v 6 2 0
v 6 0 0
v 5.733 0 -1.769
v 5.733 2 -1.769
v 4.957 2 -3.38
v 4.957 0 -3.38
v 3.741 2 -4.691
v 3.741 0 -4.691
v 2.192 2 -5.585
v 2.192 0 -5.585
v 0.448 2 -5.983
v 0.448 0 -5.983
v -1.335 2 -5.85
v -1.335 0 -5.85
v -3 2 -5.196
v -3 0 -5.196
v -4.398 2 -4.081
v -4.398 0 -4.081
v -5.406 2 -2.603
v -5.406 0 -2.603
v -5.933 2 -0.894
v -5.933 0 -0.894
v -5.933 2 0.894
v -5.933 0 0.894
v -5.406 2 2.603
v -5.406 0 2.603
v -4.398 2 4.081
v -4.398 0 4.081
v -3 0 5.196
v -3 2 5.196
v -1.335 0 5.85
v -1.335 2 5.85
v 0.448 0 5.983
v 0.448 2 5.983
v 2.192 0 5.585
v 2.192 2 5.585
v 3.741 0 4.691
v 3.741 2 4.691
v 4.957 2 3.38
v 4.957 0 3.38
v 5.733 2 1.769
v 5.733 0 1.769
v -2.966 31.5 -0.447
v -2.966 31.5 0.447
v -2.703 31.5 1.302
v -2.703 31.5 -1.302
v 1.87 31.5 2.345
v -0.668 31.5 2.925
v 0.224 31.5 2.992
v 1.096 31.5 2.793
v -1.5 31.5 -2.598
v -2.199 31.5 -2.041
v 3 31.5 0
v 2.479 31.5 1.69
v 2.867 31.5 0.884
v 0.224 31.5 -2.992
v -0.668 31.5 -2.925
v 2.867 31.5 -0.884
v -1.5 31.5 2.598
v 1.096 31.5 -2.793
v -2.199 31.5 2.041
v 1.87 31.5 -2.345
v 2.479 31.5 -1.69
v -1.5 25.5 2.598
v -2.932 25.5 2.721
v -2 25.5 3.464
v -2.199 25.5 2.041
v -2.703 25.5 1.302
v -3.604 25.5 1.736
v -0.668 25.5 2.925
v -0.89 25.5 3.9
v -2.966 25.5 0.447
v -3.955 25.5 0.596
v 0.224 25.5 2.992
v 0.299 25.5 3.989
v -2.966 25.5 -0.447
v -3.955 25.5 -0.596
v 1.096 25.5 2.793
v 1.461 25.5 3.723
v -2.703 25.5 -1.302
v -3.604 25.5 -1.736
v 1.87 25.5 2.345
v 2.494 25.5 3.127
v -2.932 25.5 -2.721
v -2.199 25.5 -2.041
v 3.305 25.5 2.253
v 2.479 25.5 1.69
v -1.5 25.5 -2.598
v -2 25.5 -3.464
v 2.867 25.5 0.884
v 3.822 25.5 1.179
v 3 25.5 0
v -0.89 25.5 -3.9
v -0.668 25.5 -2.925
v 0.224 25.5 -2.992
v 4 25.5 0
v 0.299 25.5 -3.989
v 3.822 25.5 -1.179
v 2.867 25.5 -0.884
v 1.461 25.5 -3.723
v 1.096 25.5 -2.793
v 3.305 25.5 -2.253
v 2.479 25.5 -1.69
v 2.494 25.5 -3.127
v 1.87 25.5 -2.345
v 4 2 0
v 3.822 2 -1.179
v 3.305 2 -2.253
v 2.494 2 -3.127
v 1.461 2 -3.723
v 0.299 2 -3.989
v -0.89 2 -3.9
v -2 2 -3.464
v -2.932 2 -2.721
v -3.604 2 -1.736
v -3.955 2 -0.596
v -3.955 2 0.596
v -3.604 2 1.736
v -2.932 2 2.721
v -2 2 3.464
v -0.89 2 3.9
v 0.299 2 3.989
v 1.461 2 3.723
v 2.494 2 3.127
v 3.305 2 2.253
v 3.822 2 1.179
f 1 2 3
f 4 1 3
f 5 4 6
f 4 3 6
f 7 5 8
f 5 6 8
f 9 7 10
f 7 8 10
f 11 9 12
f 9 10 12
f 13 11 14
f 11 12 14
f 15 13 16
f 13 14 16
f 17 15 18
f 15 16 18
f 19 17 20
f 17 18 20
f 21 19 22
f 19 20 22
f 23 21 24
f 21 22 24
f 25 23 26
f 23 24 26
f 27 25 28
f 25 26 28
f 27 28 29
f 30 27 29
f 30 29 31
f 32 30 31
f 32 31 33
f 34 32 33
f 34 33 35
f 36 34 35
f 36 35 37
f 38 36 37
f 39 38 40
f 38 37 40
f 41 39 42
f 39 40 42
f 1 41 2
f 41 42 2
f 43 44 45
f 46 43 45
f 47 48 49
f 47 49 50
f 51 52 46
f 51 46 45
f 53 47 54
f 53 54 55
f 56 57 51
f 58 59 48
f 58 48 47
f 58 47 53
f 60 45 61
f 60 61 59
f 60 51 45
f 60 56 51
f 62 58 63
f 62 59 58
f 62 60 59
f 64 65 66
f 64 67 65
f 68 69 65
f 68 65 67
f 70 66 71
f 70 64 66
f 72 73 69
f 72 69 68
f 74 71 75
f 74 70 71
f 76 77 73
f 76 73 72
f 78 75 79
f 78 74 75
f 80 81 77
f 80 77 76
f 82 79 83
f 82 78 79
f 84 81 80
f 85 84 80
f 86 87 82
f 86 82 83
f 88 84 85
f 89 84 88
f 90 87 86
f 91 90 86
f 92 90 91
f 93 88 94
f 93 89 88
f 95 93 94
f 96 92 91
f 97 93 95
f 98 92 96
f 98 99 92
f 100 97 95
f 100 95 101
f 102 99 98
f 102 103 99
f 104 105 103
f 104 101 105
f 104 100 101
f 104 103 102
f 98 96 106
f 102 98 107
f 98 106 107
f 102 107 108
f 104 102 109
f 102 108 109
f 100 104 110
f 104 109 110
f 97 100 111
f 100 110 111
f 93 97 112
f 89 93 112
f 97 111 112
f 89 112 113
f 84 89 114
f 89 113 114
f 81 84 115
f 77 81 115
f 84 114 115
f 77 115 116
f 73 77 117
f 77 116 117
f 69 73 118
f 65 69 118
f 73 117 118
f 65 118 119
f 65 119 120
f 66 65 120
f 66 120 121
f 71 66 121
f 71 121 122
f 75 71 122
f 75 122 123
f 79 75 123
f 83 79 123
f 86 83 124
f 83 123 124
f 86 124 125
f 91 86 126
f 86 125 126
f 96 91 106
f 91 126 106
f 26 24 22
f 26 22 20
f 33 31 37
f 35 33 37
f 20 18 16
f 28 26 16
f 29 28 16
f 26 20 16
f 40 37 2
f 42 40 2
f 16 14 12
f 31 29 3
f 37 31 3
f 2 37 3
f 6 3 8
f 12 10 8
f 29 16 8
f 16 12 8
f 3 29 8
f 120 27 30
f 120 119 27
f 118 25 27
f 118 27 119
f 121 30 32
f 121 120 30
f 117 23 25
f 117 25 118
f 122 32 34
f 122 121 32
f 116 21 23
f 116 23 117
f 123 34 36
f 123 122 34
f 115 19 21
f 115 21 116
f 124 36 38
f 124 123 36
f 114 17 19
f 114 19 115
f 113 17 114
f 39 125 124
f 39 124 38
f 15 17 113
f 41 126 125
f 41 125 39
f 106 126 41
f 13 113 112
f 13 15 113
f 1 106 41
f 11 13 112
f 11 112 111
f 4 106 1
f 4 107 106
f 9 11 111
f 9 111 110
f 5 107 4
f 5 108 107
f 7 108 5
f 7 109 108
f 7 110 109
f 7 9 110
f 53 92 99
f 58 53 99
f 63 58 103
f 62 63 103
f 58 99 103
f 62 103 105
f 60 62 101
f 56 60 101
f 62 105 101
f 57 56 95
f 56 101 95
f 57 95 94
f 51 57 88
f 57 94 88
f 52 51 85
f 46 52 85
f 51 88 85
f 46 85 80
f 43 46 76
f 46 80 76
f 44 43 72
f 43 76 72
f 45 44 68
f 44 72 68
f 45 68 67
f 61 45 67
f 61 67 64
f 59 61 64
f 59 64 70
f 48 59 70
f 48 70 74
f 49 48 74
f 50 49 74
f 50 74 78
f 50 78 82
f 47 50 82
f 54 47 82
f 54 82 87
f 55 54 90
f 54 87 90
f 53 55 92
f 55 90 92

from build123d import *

# Parameters (mm, degrees)
SKETCH_1_R      = 6
EXTRUDE_1_DEPTH = 2
SKETCH_2_R      = 4
EXTRUDE_2_DEPTH = 23.5
SKETCH_3_R      = 3
EXTRUDE_3_DEPTH = 6


with BuildPart() as part:
    # 草图1 → 凸台-拉伸1 (new body)
    with BuildSketch(Plane(origin=(0, 0, 0), x_dir=(1, 0, 0), z_dir=(0, 1, 0))):
        Circle(SKETCH_1_R)
    extrude(amount=EXTRUDE_1_DEPTH)

    # 草图2 → 凸台-拉伸2 (add)
    with BuildSketch(Plane(origin=(0, 2, 0), x_dir=(1, 0, 0), z_dir=(0, 1, 0))):
        Circle(SKETCH_2_R)
    extrude(amount=EXTRUDE_2_DEPTH)

    # 草图3 → 凸台-拉伸3 (add)
    with BuildSketch(Plane(origin=(0, 25.5, 0), x_dir=(1, 0, 0), z_dir=(0, 1, 0))):
        Circle(SKETCH_3_R)
    extrude(amount=EXTRUDE_3_DEPTH)


solid = part.part
